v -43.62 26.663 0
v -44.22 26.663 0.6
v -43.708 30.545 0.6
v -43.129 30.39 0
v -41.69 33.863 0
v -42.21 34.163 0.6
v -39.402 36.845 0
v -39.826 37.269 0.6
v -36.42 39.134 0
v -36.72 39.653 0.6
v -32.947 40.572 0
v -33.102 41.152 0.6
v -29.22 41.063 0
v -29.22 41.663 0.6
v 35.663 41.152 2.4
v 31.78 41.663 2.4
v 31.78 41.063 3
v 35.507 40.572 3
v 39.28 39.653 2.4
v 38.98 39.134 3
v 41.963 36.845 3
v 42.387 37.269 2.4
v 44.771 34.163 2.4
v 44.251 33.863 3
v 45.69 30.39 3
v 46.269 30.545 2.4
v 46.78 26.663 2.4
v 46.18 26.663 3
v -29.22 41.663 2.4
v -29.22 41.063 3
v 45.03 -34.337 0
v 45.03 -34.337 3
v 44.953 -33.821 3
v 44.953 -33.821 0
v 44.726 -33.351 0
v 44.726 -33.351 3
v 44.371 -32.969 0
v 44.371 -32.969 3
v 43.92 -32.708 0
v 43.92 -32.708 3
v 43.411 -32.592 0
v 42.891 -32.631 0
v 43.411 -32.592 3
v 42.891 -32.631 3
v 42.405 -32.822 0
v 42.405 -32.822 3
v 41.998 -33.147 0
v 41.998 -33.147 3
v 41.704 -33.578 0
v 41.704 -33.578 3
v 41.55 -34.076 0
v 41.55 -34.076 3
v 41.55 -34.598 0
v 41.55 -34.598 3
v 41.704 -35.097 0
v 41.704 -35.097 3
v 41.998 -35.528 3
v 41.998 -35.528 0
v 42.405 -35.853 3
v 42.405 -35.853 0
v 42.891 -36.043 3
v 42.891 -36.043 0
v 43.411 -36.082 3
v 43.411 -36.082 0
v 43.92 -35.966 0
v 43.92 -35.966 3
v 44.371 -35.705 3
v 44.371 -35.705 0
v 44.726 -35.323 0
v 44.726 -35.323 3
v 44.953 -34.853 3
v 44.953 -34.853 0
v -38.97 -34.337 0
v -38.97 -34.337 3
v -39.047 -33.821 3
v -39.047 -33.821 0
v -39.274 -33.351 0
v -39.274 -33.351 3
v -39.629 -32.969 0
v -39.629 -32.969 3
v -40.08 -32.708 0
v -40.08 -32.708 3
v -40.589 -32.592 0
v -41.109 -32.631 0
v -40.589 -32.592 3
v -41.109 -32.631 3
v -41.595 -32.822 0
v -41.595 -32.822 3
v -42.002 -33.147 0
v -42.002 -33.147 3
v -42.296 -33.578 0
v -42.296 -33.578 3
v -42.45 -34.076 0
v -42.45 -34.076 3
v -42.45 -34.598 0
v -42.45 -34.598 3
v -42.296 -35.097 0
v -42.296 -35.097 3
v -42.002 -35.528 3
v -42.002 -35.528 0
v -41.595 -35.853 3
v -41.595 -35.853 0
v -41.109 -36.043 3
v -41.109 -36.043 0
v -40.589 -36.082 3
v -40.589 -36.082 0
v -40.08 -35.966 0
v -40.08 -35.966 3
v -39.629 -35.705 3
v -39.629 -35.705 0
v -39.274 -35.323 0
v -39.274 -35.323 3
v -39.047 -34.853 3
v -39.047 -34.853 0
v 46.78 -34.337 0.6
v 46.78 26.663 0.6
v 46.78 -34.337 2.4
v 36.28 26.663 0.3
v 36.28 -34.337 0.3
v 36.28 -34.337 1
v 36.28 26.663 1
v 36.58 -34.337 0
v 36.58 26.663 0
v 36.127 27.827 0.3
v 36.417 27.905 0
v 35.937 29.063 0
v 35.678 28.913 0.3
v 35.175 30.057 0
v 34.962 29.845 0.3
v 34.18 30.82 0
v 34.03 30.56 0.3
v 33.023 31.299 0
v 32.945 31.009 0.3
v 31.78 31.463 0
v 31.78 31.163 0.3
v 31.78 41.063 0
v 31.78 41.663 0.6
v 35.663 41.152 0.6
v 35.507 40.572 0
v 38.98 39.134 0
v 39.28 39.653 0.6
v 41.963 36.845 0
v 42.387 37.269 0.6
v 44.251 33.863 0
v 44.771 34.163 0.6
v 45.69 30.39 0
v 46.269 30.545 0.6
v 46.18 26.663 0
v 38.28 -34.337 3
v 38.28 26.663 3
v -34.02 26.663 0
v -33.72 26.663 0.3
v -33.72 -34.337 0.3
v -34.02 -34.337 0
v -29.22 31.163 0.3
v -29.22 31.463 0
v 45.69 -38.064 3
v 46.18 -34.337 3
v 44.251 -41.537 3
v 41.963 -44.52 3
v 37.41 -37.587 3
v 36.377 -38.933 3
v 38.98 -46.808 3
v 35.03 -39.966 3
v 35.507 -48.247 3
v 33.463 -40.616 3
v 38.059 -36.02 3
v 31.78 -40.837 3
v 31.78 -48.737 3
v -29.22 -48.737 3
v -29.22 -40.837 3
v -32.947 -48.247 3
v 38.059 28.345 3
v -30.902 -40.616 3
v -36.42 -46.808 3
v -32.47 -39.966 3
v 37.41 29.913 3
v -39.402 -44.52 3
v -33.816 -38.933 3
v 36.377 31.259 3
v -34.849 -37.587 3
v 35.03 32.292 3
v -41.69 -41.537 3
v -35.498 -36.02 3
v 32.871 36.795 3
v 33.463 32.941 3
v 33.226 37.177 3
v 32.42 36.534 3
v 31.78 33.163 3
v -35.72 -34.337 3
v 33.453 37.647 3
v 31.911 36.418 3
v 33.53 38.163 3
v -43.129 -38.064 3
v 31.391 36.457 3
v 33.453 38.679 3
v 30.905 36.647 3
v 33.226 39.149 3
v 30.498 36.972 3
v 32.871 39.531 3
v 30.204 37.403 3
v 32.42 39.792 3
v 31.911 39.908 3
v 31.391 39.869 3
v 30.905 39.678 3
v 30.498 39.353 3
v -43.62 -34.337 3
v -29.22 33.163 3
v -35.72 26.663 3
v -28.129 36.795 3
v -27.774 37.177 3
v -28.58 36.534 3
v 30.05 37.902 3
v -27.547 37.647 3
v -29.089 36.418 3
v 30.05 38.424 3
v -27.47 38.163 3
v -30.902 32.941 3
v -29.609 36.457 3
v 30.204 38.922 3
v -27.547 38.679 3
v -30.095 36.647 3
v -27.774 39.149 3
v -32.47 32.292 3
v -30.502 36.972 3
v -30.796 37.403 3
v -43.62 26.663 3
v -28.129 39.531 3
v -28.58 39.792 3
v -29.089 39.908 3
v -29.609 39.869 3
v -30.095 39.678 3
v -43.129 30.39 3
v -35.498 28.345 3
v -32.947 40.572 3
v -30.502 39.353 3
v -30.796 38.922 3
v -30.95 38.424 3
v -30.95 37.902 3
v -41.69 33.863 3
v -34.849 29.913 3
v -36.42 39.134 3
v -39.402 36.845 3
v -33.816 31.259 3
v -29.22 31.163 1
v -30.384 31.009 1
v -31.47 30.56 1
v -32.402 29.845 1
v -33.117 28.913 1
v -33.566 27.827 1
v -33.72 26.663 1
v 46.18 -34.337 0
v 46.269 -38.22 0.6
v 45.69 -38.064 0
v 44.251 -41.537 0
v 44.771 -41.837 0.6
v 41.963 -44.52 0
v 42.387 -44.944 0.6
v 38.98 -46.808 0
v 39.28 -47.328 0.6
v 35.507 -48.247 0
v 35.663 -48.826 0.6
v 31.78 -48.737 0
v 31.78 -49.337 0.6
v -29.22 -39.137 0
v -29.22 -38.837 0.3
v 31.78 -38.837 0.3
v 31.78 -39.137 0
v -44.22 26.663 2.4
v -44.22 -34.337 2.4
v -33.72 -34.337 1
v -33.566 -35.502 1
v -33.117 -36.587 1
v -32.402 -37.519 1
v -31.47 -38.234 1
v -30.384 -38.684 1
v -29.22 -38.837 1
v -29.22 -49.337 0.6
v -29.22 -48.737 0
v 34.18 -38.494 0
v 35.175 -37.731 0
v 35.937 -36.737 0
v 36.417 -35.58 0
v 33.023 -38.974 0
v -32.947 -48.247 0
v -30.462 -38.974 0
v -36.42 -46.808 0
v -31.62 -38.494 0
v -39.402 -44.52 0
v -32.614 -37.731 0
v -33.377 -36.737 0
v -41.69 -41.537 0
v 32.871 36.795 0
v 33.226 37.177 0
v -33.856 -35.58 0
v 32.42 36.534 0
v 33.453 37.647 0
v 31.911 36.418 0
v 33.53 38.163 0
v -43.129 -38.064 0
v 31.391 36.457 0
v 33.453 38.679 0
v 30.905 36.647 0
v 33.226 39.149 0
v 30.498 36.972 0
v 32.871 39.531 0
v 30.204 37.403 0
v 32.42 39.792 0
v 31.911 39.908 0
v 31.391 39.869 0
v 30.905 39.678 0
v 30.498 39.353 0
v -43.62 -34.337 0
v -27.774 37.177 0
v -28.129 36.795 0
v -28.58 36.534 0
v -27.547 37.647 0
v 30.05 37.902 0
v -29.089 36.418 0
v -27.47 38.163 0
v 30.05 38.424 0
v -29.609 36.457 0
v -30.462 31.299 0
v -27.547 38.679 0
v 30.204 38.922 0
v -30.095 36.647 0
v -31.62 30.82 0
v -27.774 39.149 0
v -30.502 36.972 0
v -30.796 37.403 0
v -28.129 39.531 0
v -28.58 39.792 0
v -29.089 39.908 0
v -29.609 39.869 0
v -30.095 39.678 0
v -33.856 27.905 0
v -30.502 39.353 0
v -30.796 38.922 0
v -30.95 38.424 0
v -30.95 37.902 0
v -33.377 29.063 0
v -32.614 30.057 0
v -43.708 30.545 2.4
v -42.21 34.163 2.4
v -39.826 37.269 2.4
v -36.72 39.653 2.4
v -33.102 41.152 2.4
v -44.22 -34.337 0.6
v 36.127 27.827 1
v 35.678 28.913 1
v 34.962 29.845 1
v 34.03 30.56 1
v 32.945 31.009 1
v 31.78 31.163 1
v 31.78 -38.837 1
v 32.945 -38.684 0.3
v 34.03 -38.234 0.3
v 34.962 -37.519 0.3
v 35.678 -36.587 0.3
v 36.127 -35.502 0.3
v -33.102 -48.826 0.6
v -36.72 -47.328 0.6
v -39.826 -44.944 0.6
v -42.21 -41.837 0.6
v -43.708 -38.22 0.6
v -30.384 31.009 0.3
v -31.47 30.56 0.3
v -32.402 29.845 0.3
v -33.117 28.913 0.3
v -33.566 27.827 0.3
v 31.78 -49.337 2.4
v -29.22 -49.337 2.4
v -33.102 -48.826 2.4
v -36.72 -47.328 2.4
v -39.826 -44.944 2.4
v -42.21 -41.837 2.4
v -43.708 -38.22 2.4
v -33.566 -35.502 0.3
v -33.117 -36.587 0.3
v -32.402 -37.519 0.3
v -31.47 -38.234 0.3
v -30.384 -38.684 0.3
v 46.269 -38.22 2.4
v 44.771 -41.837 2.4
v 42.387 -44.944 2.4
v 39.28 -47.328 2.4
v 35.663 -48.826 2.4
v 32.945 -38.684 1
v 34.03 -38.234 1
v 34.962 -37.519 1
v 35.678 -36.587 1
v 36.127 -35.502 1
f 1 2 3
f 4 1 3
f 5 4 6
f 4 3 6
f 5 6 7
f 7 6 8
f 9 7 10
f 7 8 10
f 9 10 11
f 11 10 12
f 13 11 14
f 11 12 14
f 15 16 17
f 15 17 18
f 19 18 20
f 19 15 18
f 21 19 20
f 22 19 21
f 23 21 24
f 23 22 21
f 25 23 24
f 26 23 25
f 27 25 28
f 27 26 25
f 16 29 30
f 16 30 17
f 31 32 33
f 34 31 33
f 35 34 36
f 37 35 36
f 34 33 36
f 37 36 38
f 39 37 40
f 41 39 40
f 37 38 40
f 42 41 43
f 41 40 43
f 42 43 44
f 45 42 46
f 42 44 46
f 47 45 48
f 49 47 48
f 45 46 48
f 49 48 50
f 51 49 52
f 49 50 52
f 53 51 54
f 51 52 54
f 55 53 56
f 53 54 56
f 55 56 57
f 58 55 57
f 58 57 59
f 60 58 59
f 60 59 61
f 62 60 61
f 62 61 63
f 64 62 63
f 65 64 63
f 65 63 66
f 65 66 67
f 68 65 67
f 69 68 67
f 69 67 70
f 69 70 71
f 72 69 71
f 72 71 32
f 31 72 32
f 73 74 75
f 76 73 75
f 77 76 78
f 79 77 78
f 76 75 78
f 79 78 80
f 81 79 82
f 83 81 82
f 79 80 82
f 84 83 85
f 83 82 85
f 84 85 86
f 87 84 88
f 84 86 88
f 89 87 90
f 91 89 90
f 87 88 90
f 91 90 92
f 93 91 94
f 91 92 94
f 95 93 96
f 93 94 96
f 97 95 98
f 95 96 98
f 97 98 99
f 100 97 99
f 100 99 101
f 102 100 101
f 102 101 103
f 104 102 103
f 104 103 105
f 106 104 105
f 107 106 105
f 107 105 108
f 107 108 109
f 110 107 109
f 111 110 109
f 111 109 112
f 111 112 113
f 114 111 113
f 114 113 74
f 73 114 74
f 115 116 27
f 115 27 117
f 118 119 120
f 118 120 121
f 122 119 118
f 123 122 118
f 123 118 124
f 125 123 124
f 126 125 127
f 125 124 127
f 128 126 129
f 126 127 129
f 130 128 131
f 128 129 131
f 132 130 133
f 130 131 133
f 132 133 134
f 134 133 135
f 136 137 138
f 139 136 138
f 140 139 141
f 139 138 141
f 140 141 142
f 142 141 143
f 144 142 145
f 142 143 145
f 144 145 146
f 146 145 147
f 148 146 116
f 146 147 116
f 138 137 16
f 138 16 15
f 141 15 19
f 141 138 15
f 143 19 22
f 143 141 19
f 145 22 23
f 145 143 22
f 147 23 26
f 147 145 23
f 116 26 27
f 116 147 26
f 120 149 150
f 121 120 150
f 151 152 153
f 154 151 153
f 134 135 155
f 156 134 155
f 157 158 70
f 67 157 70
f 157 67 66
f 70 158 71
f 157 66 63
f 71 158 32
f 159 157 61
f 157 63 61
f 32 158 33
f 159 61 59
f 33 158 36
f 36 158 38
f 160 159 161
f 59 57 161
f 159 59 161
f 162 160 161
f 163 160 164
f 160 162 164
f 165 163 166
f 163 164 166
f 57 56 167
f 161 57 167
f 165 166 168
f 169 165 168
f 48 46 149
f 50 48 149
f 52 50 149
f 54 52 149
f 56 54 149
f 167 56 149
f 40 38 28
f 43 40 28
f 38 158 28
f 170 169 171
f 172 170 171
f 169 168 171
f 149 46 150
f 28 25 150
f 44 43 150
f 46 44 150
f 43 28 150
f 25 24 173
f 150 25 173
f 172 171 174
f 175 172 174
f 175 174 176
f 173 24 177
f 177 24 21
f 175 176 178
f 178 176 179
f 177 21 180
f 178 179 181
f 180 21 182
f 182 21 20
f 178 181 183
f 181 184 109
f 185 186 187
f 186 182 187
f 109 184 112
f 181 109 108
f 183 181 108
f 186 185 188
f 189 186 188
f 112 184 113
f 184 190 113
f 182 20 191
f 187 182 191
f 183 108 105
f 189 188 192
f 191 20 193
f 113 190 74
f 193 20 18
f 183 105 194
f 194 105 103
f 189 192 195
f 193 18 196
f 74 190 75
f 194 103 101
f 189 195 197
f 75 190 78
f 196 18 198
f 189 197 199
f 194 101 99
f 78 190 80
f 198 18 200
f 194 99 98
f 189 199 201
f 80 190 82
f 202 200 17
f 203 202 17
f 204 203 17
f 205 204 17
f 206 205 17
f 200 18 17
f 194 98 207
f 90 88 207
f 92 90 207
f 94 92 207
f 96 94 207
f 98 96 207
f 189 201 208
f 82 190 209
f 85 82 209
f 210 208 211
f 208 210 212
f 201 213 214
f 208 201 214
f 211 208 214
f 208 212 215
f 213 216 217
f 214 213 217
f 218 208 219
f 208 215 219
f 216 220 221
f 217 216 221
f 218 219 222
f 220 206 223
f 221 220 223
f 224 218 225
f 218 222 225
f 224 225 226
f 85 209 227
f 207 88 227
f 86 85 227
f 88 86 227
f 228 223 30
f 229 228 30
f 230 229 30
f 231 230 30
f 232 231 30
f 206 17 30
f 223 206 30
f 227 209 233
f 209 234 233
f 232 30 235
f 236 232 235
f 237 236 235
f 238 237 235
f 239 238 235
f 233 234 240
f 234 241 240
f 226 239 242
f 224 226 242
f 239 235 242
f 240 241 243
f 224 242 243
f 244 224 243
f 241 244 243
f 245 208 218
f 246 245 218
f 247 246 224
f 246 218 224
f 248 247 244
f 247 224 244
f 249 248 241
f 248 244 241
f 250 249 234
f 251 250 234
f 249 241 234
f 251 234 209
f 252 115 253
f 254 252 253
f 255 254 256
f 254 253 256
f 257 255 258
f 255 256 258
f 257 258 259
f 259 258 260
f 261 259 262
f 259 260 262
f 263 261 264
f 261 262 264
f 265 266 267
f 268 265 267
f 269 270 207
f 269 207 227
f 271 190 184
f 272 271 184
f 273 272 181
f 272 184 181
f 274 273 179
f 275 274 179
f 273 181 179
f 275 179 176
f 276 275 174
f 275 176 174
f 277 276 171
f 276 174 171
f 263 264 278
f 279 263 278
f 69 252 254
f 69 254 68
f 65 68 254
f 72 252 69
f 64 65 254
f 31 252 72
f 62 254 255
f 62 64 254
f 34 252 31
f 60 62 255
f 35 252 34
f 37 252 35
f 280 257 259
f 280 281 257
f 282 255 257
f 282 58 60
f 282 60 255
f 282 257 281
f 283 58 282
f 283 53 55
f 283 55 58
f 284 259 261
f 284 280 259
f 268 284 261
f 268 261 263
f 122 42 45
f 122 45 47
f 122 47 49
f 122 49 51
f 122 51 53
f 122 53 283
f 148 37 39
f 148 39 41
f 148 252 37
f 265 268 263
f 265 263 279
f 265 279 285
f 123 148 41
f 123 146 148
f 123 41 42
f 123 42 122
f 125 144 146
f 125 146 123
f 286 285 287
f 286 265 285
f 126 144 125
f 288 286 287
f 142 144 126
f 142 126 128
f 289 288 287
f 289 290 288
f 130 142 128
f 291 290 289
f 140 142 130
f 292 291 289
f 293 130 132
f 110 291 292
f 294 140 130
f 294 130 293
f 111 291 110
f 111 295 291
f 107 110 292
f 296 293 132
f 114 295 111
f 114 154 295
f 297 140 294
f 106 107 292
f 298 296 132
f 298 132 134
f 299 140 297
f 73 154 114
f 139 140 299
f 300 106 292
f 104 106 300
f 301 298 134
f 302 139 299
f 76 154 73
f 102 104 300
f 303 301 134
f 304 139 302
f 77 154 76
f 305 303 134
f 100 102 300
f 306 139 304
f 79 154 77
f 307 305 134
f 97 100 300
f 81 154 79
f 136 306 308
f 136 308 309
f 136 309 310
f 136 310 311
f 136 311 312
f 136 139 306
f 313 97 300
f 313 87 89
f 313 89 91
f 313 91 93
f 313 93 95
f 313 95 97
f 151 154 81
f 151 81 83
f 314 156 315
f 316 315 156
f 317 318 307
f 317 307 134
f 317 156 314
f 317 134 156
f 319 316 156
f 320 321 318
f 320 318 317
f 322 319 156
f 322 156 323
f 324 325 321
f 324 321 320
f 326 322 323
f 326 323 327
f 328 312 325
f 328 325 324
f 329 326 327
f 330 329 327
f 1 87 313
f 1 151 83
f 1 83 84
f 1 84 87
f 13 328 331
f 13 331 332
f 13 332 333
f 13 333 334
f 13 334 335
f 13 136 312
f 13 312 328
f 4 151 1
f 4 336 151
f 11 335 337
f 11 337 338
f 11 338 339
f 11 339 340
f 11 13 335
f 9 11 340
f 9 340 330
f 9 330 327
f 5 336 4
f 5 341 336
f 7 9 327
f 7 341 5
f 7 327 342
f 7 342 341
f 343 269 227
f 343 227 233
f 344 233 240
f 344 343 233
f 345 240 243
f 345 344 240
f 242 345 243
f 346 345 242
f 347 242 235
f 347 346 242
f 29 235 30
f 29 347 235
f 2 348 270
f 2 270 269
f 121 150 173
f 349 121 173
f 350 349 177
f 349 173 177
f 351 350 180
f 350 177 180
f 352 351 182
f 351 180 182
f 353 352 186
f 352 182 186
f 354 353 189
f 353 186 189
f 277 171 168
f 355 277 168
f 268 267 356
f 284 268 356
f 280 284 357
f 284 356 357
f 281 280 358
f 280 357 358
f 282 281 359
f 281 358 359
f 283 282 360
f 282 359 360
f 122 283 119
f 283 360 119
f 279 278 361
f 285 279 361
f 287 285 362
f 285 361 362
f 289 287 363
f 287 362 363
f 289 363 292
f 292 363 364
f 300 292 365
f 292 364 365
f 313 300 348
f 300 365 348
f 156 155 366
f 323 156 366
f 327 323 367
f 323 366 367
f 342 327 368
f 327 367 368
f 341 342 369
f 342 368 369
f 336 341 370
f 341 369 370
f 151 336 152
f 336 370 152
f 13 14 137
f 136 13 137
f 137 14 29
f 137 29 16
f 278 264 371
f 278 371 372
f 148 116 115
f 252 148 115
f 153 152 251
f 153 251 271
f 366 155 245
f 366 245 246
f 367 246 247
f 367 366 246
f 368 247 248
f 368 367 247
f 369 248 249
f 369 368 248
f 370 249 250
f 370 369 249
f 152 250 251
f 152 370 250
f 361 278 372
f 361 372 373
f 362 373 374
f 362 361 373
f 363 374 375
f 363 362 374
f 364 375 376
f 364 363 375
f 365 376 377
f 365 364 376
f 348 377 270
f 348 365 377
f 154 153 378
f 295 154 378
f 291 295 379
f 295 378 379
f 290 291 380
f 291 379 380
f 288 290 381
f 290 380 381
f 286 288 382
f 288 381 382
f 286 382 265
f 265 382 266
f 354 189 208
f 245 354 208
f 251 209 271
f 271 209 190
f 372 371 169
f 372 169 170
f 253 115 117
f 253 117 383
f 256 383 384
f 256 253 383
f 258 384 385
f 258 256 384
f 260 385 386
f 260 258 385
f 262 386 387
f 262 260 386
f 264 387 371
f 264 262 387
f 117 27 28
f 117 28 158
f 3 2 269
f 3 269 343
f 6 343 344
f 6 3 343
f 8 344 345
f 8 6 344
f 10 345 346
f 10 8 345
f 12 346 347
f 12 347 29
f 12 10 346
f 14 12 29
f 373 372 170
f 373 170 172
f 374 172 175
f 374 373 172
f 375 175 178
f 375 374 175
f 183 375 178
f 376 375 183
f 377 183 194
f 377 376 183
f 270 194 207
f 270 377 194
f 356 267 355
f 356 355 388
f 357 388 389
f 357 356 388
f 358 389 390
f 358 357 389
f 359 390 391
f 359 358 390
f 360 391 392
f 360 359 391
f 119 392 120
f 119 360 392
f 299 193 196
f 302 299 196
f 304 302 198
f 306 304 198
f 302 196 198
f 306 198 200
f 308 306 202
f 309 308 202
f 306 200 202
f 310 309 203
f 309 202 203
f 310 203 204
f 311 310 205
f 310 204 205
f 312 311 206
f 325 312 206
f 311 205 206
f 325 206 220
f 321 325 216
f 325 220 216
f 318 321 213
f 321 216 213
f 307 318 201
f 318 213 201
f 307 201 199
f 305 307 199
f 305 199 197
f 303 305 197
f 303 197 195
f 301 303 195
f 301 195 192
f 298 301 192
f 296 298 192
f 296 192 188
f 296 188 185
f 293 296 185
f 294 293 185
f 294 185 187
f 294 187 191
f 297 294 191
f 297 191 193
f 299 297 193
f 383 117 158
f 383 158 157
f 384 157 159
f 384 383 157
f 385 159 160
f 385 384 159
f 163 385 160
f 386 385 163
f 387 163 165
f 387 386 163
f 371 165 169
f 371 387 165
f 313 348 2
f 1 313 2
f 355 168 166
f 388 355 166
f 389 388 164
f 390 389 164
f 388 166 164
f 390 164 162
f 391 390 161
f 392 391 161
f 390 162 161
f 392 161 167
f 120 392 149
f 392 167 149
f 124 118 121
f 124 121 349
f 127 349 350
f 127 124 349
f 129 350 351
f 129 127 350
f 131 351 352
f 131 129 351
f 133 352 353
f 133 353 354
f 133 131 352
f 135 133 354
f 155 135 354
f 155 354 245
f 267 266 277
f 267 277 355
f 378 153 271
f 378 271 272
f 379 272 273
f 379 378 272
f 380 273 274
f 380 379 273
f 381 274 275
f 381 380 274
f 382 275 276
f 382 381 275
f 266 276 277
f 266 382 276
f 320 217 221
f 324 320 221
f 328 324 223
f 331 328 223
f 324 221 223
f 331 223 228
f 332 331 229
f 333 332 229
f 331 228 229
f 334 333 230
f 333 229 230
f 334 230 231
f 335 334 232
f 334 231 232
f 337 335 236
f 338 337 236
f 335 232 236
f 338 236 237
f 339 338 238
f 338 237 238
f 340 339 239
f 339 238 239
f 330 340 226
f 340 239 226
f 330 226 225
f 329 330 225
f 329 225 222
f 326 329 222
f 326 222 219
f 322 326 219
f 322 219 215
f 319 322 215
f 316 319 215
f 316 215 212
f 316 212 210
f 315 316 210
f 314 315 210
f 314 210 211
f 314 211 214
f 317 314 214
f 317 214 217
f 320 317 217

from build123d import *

# Parameters (mm, degrees)
SKETCH2_R           = 1.25
BOSS_EXTRUDE1_DEPTH = 3
CHAMFER1_SIZE       = 2
CHAMFER2_SIZE       = 0.6
CHAMFER3_SIZE       = 0.3
SKETCH3_R           = 1.75
CUT_EXTRUDE1_DEPTH  = 4


with BuildPart() as part:
    # Sketch2 → Boss-Extrude1 (new body)
    with BuildSketch(Plane.XY):
        with BuildLine():
            Line((-44.219607843, -34.337254902), (-44.219607843, 26.662745098))
            ThreePointArc((-44.219607843, 26.662745098), (-39.826209561, 37.269346816), (-29.219607843, 41.662745098))
            Line((-29.219607843, 41.662745098), (31.780392157, 41.662745098))
            ThreePointArc((31.780392157, 41.662745098), (42.386993875, 37.269346816), (46.780392157, 26.662745098))
            Line((46.780392157, 26.662745098), (46.780392157, -34.337254902))
            ThreePointArc((46.780392157, -34.337254902), (42.386993875, -44.94385662), (31.780392157, -49.337254902))
            Line((31.780392157, -49.337254902), (-29.219607843, -49.337254902))
            ThreePointArc((-29.219607843, -49.337254902), (-39.826209561, -44.94385662), (-44.219607843, -34.337254902))
        make_face()
        with Locations((43.280392157, -34.337254902)):
            Circle(SKETCH2_R, mode=Mode.SUBTRACT)
        with Locations((31.780392157, 38.162745098)):
            Circle(SKETCH2_R, mode=Mode.SUBTRACT)
        with Locations((-29.219607843, 38.162745098)):
            Circle(SKETCH2_R, mode=Mode.SUBTRACT)
        with Locations((-40.719607843, -34.337254902)):
            Circle(SKETCH2_R, mode=Mode.SUBTRACT)
        with BuildLine():
            ThreePointArc((-29.219607843, 31.162745098), (-32.401588358, 29.844725613), (-33.719607843, 26.662745098))
            Line((-33.719607843, 26.662745098), (-33.719607843, -34.337254902))
            ThreePointArc((-33.719607843, -34.337254902), (-32.401588358, -37.519235417), (-29.219607843, -38.837254902))
            Line((-29.219607843, -38.837254902), (31.780392157, -38.837254902))
            ThreePointArc((31.780392157, -38.837254902), (34.962372672, -37.519235417), (36.280392157, -34.337254902))
            Line((36.280392157, -34.337254902), (36.280392157, 26.662745098))
            ThreePointArc((36.280392157, 26.662745098), (34.962372672, 29.844725613), (31.780392157, 31.162745098))
            Line((31.780392157, 31.162745098), (-29.219607843, 31.162745098))
        make_face(mode=Mode.SUBTRACT)
    extrude(amount=BOSS_EXTRUDE1_DEPTH)

    # Chamfer1
    chamfer1_edges = [part.edges().sort_by_distance(p)[0] for p in [
        (-32.401588358, 29.844725613, 3),
        (1.280392157, 31.162745098, 3),
        (34.962372672, 29.844725613, 3),
        (36.280392157, -3.837254902, 3),
        (34.962372672, -37.519235417, 3),
        (1.280392157, -38.837254902, 3),
        (-32.401588358, -37.519235417, 3),
        (-33.719607843, -3.837254902, 3),
    ]]
    chamfer(chamfer1_edges, length=CHAMFER1_SIZE)

    # Chamfer2
    chamfer2_edges = [part.edges().sort_by_distance(p)[0] for p in [
        (1.280392157, 41.662745098, 3),
        (-39.826209561, 37.269346816, 3),
        (-39.826209561, 37.269346816, 0),
        (1.280392157, 41.662745098, 0),
        (42.386993875, 37.269346816, 0),
        (46.780392157, -3.837254902, 0),
        (42.386993875, -44.94385662, 0),
        (1.280392157, -49.337254902, 0),
        (-39.826209561, -44.94385662, 0),
        (-44.219607843, -3.837254902, 0),
        (-44.219607843, -3.837254902, 3),
        (-39.826209561, -44.94385662, 3),
        (1.280392157, -49.337254902, 3),
        (42.386993875, -44.94385662, 3),
        (46.780392157, -3.837254902, 3),
        (42.386993875, 37.269346816, 3),
    ]]
    chamfer(chamfer2_edges, length=CHAMFER2_SIZE)

    # Chamfer3
    chamfer3_edges = [part.edges().sort_by_distance(p)[0] for p in [
        (-33.719607843, -3.837254902, 0),
        (-32.401588358, -37.519235417, 0),
        (1.280392157, -38.837254902, 0),
        (34.962372672, -37.519235417, 0),
        (36.280392157, -3.837254902, 0),
        (34.962372672, 29.844725613, 0),
        (1.280392157, 31.162745098, 0),
        (-32.401588358, 29.844725613, 0),
    ]]
    chamfer(chamfer3_edges, length=CHAMFER3_SIZE)

    # Sketch3 → Cut-Extrude1 (cut, through all)
    with BuildSketch(Plane.XY.offset(3)):
        with Locations((-29.219607843, 38.162745098)):
            Circle(SKETCH3_R)
        with Locations((31.780392157, 38.162745098)):
            Circle(SKETCH3_R)
        with Locations((-40.719607843, -34.337254902)):
            Circle(SKETCH3_R)
        with Locations((43.280392157, -34.337254902)):
            Circle(SKETCH3_R)
    extrude(amount=-CUT_EXTRUDE1_DEPTH, mode=Mode.SUBTRACT)


solid = part.part
